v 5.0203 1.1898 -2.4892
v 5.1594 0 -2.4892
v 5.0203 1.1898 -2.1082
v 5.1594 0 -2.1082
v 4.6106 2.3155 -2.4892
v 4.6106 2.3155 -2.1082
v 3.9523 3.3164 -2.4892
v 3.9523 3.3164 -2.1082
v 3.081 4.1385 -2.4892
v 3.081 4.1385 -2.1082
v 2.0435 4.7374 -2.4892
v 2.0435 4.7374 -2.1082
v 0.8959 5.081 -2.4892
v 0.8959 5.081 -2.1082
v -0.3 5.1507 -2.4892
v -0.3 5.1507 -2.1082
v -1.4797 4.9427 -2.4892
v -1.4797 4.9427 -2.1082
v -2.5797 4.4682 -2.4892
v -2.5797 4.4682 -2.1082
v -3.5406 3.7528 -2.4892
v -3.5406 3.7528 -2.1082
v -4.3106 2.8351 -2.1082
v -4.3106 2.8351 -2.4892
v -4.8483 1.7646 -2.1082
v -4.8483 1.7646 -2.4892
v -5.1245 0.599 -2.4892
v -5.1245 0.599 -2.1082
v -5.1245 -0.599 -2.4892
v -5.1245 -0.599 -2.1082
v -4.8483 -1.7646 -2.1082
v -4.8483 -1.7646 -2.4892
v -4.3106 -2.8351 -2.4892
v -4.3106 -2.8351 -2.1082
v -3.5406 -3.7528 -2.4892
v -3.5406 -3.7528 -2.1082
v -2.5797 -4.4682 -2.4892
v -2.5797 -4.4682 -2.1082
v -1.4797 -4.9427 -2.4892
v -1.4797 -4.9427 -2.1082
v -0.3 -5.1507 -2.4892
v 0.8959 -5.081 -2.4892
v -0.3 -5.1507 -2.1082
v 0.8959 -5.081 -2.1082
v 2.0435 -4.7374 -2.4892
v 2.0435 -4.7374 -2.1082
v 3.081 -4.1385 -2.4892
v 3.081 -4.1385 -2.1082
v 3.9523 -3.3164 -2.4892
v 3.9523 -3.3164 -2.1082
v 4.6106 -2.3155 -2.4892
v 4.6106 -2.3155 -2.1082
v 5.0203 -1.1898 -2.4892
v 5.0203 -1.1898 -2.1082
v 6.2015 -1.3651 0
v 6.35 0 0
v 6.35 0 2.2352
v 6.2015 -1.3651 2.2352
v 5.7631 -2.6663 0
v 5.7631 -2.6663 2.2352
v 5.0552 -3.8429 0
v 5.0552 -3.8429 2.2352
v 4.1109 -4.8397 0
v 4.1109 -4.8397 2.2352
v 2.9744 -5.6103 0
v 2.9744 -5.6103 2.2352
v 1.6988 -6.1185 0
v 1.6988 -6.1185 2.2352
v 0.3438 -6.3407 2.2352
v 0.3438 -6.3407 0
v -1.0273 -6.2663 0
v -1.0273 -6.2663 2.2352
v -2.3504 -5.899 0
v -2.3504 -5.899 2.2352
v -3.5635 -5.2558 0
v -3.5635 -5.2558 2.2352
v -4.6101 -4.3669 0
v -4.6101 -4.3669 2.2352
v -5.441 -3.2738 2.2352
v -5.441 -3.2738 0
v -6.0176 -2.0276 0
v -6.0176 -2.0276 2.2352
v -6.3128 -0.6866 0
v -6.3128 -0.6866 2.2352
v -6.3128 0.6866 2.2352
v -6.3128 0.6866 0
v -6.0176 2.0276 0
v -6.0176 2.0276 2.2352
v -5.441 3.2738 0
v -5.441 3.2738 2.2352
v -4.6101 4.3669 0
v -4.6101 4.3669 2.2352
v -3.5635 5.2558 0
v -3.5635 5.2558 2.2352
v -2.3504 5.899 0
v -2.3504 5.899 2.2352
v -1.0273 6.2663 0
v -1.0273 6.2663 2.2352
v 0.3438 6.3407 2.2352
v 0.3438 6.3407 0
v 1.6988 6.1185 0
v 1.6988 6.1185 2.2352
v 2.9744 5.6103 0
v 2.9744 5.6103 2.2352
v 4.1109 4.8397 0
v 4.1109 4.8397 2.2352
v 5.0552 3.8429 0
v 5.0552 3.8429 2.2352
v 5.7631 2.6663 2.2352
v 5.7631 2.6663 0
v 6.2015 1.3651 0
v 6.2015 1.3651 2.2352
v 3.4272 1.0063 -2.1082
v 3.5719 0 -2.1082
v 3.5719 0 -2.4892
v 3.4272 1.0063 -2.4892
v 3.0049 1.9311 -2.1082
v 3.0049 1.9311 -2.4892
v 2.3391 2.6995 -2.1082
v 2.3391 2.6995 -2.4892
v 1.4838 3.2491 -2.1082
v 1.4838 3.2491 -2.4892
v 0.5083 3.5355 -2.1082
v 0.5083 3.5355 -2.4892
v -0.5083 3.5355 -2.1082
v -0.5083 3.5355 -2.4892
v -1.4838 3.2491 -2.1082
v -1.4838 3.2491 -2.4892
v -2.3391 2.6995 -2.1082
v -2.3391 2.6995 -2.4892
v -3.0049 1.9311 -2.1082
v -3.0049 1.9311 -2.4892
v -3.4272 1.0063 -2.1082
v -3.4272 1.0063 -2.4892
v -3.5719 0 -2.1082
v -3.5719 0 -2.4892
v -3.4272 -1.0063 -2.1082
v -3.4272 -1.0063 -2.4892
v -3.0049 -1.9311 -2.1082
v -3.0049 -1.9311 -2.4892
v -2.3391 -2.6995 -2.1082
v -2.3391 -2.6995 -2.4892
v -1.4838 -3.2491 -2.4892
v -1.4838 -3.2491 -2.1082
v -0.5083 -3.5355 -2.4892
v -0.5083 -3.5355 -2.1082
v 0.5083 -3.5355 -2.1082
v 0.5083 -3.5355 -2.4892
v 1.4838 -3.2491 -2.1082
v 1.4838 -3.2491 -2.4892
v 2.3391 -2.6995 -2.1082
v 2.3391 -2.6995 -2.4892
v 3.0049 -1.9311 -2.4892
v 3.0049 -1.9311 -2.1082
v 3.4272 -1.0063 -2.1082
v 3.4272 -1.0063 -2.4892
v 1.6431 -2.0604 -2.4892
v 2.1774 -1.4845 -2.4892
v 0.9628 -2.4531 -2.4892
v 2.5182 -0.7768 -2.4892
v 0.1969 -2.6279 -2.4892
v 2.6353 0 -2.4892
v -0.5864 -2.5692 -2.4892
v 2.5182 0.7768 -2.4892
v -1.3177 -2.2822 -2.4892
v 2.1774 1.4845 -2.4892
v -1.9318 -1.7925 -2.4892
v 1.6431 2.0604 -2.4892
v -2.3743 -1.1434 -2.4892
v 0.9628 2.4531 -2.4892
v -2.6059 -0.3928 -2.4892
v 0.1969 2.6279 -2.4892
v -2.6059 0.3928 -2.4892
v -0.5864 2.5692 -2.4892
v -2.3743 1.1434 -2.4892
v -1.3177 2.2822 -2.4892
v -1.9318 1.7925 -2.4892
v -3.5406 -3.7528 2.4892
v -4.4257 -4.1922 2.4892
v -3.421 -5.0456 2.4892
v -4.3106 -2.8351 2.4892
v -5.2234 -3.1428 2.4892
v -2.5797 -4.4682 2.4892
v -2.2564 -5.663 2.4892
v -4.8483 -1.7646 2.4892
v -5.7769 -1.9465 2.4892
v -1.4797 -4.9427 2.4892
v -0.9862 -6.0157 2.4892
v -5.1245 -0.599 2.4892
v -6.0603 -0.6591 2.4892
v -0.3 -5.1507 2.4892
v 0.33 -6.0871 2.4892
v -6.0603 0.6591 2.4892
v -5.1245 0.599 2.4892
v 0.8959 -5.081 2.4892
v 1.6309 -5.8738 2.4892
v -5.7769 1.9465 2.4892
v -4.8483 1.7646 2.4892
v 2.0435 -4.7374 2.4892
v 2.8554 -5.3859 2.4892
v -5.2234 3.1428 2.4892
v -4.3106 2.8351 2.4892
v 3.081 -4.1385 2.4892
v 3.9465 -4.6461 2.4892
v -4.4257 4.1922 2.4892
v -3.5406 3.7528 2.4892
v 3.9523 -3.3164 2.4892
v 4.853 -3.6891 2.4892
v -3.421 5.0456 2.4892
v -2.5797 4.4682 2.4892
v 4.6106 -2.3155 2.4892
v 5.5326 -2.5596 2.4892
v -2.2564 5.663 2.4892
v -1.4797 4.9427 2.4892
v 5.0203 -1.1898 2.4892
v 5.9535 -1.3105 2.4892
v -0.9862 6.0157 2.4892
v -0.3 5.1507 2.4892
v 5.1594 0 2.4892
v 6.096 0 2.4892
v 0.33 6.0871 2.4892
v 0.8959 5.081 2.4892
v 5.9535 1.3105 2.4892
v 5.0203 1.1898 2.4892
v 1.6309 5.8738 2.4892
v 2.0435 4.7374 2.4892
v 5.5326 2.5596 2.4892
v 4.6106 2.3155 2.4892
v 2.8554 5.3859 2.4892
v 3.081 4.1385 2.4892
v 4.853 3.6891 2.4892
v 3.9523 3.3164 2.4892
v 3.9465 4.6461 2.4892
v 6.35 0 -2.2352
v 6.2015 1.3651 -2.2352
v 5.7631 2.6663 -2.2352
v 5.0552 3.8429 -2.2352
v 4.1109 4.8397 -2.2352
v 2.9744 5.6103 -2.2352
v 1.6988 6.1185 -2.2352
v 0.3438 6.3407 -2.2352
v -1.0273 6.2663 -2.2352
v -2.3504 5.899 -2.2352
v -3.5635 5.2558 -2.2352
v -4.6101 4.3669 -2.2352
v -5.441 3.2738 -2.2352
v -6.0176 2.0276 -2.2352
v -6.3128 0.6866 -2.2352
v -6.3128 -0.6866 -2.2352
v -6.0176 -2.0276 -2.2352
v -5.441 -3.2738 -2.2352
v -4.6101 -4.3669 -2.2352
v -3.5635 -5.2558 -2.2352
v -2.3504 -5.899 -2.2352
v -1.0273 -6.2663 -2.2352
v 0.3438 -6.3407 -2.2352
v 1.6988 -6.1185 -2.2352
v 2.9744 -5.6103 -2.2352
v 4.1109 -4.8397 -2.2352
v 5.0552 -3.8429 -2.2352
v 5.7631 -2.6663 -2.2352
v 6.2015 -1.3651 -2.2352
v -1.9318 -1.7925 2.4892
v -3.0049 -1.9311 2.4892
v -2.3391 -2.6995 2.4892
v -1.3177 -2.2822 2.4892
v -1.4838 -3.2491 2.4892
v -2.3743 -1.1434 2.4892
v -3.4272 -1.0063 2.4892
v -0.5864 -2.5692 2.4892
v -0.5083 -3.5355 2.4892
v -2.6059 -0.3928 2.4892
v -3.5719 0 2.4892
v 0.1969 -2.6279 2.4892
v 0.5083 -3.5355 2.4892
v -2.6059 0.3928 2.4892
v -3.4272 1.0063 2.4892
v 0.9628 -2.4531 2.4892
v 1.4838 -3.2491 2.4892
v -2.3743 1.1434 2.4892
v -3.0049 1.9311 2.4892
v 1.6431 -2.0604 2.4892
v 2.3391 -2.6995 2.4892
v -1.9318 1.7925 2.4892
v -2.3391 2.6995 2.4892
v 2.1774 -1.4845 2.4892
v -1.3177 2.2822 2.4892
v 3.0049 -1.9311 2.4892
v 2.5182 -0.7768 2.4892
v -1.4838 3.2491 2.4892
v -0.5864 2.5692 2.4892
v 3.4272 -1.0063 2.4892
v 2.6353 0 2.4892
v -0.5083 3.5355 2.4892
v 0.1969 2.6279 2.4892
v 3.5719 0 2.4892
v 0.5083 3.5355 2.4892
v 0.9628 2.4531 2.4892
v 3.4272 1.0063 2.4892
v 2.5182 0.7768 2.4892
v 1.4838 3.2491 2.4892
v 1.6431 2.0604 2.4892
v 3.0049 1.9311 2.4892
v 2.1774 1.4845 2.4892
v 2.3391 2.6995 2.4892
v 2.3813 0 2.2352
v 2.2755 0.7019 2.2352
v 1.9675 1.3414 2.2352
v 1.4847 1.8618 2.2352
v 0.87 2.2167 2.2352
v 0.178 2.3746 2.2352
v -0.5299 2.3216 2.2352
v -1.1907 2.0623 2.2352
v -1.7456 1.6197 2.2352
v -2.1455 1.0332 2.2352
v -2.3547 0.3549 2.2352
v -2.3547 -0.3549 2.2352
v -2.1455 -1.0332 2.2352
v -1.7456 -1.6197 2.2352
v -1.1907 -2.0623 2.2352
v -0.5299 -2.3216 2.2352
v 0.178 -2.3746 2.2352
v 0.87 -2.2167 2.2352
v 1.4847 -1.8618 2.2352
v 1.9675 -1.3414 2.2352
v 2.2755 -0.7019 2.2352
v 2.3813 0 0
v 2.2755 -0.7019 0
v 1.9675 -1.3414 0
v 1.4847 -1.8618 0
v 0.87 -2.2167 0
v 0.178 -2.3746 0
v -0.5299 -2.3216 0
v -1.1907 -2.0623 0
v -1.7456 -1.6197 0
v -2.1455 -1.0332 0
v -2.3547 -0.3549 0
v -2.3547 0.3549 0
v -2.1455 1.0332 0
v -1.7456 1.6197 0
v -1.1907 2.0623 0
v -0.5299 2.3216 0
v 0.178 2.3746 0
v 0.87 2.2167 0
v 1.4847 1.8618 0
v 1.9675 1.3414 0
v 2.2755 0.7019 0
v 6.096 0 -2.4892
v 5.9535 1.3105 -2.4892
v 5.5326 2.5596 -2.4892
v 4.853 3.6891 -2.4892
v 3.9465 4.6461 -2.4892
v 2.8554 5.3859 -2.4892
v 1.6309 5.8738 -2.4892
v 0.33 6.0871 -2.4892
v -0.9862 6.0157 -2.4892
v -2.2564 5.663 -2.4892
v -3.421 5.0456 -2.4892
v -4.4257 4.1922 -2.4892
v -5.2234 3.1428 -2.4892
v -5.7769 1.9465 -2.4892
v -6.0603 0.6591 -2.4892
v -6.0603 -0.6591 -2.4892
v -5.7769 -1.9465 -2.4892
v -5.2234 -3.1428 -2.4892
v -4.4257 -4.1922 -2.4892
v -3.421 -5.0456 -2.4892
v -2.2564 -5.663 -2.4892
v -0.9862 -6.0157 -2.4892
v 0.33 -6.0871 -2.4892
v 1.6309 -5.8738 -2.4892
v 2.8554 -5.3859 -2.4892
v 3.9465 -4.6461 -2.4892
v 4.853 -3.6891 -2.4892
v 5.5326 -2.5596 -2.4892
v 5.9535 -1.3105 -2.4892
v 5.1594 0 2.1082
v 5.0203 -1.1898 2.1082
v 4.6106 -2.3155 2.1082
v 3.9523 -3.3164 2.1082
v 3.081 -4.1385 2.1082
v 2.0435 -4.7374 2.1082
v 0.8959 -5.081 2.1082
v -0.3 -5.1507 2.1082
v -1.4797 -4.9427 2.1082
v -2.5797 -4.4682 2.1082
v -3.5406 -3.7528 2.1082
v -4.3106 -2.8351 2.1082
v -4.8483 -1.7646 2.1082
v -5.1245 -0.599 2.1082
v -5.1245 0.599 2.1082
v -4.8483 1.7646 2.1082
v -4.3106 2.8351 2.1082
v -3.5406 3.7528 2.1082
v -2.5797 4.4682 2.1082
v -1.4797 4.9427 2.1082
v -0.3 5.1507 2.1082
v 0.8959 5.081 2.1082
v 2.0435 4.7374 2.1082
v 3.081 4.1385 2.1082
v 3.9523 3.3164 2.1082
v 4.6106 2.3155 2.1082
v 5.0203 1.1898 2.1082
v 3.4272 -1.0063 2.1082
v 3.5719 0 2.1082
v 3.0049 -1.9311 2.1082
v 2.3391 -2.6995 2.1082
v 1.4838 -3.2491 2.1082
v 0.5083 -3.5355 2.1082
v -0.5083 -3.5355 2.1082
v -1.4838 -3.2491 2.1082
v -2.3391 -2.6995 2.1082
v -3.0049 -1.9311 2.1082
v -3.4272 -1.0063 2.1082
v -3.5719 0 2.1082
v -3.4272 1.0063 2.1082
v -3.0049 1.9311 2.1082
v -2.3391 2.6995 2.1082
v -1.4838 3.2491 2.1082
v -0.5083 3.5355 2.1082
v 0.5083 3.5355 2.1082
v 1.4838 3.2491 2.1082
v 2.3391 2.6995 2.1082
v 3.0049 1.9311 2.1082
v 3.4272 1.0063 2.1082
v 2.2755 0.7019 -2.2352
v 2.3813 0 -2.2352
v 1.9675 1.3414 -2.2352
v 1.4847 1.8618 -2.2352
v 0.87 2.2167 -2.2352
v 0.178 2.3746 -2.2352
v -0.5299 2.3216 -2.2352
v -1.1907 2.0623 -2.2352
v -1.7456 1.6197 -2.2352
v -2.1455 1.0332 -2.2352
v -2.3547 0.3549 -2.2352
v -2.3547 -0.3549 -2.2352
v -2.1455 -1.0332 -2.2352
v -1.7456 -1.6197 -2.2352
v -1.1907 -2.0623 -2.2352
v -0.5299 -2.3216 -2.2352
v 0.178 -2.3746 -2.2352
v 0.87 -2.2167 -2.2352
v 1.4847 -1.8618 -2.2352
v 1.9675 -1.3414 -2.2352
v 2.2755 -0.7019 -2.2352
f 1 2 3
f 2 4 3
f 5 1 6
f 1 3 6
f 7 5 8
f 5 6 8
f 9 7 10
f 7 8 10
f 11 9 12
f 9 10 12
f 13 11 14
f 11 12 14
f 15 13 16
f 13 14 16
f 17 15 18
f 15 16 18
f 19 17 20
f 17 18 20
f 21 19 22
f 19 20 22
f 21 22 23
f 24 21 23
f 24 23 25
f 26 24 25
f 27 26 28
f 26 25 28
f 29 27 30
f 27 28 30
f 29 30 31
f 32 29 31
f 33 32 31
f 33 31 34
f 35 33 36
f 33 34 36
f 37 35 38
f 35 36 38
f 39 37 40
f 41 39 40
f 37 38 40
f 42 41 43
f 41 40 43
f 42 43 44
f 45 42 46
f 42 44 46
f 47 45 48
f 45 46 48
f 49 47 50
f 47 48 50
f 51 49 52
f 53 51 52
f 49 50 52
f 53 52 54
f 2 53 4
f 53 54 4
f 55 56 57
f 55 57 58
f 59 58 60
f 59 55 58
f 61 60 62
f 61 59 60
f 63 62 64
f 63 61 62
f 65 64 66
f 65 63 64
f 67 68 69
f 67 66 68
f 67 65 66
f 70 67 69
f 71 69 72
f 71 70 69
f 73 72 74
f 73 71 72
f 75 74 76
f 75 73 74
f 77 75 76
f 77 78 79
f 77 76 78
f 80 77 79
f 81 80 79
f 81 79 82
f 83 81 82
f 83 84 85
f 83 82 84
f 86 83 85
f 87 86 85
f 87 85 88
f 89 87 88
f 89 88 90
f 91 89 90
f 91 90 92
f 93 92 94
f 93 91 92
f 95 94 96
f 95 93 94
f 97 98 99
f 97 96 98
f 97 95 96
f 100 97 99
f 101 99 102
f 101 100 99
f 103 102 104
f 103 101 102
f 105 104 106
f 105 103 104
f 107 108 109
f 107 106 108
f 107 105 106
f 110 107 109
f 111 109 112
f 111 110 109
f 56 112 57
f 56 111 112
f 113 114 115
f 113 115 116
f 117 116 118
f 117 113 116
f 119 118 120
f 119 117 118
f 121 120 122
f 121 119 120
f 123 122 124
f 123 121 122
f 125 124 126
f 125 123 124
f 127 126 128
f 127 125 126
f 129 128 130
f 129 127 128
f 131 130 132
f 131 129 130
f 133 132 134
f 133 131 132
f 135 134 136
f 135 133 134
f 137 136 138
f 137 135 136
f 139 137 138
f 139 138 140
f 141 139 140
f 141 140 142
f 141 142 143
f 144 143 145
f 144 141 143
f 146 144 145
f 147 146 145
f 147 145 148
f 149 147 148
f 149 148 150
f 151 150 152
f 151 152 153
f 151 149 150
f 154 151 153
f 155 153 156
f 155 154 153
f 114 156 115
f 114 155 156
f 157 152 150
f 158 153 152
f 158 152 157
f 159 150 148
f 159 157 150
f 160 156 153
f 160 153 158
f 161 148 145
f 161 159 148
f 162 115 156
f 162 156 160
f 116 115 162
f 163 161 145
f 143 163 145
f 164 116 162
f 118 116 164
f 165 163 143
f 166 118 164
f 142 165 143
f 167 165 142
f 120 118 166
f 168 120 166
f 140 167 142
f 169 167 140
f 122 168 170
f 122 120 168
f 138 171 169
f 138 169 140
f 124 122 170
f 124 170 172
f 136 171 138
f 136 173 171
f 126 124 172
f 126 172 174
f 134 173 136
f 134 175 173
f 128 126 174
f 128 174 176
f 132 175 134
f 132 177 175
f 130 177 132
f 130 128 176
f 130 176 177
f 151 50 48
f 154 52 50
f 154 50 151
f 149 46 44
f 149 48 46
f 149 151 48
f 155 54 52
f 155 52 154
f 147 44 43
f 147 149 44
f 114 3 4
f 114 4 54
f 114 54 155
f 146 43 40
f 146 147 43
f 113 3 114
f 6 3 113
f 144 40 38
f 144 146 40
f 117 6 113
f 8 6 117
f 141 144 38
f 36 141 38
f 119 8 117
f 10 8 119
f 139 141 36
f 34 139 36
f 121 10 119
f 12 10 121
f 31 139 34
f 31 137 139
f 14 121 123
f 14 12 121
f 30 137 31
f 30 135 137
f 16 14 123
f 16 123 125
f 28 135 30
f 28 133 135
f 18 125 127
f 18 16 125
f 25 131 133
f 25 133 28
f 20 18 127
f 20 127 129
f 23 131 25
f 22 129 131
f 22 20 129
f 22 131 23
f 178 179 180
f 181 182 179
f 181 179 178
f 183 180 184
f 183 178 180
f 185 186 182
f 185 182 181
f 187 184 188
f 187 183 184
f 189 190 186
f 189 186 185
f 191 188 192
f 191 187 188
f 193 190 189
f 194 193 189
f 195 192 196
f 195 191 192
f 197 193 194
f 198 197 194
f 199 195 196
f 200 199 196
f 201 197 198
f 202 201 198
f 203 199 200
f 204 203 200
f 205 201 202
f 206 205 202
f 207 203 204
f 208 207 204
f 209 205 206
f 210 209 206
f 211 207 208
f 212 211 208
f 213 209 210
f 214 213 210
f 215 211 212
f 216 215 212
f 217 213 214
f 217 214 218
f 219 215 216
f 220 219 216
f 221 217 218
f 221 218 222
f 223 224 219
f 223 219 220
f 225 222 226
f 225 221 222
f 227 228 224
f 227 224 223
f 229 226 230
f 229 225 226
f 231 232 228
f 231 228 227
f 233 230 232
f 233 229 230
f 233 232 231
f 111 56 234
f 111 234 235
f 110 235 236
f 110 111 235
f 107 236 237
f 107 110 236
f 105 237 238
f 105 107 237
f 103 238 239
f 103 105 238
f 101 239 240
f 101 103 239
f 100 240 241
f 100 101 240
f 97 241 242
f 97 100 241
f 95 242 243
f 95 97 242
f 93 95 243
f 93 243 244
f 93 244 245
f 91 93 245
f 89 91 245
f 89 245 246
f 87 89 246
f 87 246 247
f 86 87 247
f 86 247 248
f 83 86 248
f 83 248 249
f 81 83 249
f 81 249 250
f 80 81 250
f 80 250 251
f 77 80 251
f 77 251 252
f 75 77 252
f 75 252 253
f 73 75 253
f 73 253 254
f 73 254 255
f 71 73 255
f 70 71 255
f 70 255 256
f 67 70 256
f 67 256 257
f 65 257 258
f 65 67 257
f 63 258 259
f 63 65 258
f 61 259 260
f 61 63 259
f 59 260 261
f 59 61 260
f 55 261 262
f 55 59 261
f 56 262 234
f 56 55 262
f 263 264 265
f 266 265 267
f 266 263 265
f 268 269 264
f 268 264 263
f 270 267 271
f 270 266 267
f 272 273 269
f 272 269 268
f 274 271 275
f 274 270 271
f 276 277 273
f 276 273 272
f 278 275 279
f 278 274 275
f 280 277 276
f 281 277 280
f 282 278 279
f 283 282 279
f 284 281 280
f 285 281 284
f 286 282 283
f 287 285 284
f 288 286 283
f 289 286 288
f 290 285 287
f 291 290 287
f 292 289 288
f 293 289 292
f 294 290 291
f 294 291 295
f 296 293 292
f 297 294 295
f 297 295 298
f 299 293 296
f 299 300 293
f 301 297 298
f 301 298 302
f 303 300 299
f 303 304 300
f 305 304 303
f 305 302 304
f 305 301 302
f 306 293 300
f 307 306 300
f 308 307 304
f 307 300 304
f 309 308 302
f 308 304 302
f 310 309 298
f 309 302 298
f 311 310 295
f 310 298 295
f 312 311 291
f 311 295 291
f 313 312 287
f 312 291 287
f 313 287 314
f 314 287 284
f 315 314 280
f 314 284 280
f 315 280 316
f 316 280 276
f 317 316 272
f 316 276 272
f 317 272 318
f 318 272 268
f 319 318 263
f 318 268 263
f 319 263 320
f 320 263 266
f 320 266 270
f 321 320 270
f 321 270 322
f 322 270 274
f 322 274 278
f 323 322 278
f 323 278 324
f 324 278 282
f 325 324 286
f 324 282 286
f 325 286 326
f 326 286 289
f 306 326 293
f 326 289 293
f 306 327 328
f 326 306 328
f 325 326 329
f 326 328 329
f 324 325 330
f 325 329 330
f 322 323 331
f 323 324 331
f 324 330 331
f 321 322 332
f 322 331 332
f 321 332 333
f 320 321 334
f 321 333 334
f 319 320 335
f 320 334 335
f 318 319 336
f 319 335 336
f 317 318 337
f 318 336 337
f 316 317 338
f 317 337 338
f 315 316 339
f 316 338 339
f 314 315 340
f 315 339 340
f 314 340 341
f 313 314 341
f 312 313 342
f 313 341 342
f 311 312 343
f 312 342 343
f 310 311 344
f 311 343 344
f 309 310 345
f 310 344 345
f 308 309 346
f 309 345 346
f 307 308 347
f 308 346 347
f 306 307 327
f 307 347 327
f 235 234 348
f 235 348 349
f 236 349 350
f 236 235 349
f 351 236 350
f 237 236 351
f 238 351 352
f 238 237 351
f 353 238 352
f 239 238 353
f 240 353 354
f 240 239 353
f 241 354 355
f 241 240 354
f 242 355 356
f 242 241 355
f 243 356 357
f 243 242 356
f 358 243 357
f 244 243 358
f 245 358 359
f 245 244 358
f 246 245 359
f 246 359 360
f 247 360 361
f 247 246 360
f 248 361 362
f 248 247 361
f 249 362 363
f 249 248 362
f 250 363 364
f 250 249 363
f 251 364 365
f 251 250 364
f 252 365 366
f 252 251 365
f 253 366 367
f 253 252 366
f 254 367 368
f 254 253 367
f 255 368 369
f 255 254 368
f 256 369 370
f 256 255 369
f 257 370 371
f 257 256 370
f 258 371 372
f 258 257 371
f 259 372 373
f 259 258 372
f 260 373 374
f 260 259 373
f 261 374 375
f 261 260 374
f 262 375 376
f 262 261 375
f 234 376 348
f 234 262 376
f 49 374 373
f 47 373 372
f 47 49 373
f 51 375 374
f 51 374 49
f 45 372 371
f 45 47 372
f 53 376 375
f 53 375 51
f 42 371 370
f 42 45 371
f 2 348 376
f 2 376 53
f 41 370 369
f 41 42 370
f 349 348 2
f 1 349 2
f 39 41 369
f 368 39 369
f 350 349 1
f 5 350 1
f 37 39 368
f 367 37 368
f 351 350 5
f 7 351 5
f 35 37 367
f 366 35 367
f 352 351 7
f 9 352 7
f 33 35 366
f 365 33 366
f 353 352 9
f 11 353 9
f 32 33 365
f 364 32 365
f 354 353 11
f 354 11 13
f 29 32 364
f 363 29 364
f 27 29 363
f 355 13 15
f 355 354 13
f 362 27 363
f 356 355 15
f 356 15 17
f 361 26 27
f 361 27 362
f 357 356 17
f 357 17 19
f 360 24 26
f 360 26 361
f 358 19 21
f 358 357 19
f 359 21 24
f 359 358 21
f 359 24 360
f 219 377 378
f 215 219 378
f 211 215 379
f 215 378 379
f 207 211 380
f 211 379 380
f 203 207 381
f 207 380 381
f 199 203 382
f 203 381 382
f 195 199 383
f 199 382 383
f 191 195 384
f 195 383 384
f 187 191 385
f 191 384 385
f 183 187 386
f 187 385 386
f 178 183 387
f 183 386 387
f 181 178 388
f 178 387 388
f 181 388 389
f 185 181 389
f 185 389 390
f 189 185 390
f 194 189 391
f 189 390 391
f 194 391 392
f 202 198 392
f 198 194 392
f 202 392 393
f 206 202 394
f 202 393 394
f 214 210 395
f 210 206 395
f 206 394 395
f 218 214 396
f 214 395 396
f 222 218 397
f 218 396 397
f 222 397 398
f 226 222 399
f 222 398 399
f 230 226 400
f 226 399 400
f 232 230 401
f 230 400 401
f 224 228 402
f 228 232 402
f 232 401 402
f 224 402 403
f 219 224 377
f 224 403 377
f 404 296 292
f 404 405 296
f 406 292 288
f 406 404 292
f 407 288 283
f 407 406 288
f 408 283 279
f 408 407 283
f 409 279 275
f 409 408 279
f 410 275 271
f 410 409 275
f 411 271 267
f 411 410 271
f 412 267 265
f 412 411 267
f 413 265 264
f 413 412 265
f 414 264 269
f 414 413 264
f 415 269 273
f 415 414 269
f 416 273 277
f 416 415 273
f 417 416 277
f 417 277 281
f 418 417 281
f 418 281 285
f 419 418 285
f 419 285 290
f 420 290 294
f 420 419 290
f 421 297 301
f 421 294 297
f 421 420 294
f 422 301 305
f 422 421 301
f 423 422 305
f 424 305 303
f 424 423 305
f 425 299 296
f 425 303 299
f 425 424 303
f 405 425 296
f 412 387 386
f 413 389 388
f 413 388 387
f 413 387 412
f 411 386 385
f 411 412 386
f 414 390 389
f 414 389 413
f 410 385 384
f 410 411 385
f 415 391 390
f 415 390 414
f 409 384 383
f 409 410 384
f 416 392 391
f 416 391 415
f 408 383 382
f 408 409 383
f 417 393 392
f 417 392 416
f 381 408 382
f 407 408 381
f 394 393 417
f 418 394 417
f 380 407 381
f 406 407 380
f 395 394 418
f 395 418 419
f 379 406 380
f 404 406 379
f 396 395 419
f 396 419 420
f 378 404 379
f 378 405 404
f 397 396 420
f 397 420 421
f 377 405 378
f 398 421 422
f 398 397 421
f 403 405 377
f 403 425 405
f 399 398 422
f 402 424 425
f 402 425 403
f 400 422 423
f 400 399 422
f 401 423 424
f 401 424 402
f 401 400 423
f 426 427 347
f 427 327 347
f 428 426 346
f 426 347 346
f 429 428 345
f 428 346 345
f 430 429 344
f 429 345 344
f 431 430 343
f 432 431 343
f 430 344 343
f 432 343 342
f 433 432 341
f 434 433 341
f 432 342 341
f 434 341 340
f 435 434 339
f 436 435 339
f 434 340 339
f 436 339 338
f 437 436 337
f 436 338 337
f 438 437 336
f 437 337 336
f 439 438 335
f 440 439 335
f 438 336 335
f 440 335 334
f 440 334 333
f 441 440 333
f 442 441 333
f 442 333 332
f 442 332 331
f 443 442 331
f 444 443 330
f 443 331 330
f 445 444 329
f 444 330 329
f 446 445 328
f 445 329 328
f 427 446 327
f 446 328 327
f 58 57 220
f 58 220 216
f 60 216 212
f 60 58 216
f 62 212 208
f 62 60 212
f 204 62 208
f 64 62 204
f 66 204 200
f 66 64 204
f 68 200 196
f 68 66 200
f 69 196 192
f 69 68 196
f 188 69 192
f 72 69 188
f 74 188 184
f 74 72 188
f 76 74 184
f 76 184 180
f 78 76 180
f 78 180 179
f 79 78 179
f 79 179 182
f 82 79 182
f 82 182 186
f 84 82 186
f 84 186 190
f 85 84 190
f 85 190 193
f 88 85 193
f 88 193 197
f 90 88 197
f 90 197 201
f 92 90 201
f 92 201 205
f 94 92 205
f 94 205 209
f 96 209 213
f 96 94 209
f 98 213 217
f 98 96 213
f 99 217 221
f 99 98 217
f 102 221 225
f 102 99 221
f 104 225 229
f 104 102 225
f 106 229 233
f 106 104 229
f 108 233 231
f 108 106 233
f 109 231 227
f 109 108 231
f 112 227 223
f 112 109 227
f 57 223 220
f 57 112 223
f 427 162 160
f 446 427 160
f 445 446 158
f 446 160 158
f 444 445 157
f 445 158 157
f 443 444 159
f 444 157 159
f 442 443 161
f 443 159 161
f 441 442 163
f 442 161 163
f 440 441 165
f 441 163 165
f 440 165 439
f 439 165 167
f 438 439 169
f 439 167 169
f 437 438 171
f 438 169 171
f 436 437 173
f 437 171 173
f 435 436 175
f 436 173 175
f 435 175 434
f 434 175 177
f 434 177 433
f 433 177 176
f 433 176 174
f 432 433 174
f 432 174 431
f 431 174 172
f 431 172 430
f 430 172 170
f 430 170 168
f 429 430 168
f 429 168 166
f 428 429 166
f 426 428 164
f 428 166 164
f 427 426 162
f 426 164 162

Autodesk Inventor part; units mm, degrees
ref_plane "YZ Plane" through (0, 0, 0) normal (1, 0, 0) x (0, 1, 0)
ref_plane "XZ Plane" through (0, 0, 0) normal (0, 1, 0) x (-1, 0, 0)
ref_plane "XY Plane" through (0, 0, 0) normal (0, 0, 1) x (1, 0, 0)
sketch "Sketch1" plane through (0, 0, 0) normal (0, 0, 1) x (1, 0, 0)
  circle A0 centre (0, 0) radius 6.35
  circle A1 centre (0, 0) radius 2.3813
  circle A2 centre (0, 0) radius 3.5719
  circle A3 centre (0, 0) radius 5.1594
  dimension "d0" = 12.7
  dimension "d1" = 4.7625
  dimension "d2" = 7.1437
  dimension "d3" = 10.3187
extrude "Extrusion1" add sketch "Sketch1" along normal blind 2.4892
extrude "Extrusion2" add sketch "Sketch1" along normal blind 2.1082 contours A3
chamfer "Chamfer1" distance 0.254 angle 45 2 edges at (-6.35, 0, 2.4892) (-2.3813, 0, 2.4892)
mirror "Mirror1" about plane through (0, 0, 0) normal (0, 0, -1)
properties part number "R3-2RS"
